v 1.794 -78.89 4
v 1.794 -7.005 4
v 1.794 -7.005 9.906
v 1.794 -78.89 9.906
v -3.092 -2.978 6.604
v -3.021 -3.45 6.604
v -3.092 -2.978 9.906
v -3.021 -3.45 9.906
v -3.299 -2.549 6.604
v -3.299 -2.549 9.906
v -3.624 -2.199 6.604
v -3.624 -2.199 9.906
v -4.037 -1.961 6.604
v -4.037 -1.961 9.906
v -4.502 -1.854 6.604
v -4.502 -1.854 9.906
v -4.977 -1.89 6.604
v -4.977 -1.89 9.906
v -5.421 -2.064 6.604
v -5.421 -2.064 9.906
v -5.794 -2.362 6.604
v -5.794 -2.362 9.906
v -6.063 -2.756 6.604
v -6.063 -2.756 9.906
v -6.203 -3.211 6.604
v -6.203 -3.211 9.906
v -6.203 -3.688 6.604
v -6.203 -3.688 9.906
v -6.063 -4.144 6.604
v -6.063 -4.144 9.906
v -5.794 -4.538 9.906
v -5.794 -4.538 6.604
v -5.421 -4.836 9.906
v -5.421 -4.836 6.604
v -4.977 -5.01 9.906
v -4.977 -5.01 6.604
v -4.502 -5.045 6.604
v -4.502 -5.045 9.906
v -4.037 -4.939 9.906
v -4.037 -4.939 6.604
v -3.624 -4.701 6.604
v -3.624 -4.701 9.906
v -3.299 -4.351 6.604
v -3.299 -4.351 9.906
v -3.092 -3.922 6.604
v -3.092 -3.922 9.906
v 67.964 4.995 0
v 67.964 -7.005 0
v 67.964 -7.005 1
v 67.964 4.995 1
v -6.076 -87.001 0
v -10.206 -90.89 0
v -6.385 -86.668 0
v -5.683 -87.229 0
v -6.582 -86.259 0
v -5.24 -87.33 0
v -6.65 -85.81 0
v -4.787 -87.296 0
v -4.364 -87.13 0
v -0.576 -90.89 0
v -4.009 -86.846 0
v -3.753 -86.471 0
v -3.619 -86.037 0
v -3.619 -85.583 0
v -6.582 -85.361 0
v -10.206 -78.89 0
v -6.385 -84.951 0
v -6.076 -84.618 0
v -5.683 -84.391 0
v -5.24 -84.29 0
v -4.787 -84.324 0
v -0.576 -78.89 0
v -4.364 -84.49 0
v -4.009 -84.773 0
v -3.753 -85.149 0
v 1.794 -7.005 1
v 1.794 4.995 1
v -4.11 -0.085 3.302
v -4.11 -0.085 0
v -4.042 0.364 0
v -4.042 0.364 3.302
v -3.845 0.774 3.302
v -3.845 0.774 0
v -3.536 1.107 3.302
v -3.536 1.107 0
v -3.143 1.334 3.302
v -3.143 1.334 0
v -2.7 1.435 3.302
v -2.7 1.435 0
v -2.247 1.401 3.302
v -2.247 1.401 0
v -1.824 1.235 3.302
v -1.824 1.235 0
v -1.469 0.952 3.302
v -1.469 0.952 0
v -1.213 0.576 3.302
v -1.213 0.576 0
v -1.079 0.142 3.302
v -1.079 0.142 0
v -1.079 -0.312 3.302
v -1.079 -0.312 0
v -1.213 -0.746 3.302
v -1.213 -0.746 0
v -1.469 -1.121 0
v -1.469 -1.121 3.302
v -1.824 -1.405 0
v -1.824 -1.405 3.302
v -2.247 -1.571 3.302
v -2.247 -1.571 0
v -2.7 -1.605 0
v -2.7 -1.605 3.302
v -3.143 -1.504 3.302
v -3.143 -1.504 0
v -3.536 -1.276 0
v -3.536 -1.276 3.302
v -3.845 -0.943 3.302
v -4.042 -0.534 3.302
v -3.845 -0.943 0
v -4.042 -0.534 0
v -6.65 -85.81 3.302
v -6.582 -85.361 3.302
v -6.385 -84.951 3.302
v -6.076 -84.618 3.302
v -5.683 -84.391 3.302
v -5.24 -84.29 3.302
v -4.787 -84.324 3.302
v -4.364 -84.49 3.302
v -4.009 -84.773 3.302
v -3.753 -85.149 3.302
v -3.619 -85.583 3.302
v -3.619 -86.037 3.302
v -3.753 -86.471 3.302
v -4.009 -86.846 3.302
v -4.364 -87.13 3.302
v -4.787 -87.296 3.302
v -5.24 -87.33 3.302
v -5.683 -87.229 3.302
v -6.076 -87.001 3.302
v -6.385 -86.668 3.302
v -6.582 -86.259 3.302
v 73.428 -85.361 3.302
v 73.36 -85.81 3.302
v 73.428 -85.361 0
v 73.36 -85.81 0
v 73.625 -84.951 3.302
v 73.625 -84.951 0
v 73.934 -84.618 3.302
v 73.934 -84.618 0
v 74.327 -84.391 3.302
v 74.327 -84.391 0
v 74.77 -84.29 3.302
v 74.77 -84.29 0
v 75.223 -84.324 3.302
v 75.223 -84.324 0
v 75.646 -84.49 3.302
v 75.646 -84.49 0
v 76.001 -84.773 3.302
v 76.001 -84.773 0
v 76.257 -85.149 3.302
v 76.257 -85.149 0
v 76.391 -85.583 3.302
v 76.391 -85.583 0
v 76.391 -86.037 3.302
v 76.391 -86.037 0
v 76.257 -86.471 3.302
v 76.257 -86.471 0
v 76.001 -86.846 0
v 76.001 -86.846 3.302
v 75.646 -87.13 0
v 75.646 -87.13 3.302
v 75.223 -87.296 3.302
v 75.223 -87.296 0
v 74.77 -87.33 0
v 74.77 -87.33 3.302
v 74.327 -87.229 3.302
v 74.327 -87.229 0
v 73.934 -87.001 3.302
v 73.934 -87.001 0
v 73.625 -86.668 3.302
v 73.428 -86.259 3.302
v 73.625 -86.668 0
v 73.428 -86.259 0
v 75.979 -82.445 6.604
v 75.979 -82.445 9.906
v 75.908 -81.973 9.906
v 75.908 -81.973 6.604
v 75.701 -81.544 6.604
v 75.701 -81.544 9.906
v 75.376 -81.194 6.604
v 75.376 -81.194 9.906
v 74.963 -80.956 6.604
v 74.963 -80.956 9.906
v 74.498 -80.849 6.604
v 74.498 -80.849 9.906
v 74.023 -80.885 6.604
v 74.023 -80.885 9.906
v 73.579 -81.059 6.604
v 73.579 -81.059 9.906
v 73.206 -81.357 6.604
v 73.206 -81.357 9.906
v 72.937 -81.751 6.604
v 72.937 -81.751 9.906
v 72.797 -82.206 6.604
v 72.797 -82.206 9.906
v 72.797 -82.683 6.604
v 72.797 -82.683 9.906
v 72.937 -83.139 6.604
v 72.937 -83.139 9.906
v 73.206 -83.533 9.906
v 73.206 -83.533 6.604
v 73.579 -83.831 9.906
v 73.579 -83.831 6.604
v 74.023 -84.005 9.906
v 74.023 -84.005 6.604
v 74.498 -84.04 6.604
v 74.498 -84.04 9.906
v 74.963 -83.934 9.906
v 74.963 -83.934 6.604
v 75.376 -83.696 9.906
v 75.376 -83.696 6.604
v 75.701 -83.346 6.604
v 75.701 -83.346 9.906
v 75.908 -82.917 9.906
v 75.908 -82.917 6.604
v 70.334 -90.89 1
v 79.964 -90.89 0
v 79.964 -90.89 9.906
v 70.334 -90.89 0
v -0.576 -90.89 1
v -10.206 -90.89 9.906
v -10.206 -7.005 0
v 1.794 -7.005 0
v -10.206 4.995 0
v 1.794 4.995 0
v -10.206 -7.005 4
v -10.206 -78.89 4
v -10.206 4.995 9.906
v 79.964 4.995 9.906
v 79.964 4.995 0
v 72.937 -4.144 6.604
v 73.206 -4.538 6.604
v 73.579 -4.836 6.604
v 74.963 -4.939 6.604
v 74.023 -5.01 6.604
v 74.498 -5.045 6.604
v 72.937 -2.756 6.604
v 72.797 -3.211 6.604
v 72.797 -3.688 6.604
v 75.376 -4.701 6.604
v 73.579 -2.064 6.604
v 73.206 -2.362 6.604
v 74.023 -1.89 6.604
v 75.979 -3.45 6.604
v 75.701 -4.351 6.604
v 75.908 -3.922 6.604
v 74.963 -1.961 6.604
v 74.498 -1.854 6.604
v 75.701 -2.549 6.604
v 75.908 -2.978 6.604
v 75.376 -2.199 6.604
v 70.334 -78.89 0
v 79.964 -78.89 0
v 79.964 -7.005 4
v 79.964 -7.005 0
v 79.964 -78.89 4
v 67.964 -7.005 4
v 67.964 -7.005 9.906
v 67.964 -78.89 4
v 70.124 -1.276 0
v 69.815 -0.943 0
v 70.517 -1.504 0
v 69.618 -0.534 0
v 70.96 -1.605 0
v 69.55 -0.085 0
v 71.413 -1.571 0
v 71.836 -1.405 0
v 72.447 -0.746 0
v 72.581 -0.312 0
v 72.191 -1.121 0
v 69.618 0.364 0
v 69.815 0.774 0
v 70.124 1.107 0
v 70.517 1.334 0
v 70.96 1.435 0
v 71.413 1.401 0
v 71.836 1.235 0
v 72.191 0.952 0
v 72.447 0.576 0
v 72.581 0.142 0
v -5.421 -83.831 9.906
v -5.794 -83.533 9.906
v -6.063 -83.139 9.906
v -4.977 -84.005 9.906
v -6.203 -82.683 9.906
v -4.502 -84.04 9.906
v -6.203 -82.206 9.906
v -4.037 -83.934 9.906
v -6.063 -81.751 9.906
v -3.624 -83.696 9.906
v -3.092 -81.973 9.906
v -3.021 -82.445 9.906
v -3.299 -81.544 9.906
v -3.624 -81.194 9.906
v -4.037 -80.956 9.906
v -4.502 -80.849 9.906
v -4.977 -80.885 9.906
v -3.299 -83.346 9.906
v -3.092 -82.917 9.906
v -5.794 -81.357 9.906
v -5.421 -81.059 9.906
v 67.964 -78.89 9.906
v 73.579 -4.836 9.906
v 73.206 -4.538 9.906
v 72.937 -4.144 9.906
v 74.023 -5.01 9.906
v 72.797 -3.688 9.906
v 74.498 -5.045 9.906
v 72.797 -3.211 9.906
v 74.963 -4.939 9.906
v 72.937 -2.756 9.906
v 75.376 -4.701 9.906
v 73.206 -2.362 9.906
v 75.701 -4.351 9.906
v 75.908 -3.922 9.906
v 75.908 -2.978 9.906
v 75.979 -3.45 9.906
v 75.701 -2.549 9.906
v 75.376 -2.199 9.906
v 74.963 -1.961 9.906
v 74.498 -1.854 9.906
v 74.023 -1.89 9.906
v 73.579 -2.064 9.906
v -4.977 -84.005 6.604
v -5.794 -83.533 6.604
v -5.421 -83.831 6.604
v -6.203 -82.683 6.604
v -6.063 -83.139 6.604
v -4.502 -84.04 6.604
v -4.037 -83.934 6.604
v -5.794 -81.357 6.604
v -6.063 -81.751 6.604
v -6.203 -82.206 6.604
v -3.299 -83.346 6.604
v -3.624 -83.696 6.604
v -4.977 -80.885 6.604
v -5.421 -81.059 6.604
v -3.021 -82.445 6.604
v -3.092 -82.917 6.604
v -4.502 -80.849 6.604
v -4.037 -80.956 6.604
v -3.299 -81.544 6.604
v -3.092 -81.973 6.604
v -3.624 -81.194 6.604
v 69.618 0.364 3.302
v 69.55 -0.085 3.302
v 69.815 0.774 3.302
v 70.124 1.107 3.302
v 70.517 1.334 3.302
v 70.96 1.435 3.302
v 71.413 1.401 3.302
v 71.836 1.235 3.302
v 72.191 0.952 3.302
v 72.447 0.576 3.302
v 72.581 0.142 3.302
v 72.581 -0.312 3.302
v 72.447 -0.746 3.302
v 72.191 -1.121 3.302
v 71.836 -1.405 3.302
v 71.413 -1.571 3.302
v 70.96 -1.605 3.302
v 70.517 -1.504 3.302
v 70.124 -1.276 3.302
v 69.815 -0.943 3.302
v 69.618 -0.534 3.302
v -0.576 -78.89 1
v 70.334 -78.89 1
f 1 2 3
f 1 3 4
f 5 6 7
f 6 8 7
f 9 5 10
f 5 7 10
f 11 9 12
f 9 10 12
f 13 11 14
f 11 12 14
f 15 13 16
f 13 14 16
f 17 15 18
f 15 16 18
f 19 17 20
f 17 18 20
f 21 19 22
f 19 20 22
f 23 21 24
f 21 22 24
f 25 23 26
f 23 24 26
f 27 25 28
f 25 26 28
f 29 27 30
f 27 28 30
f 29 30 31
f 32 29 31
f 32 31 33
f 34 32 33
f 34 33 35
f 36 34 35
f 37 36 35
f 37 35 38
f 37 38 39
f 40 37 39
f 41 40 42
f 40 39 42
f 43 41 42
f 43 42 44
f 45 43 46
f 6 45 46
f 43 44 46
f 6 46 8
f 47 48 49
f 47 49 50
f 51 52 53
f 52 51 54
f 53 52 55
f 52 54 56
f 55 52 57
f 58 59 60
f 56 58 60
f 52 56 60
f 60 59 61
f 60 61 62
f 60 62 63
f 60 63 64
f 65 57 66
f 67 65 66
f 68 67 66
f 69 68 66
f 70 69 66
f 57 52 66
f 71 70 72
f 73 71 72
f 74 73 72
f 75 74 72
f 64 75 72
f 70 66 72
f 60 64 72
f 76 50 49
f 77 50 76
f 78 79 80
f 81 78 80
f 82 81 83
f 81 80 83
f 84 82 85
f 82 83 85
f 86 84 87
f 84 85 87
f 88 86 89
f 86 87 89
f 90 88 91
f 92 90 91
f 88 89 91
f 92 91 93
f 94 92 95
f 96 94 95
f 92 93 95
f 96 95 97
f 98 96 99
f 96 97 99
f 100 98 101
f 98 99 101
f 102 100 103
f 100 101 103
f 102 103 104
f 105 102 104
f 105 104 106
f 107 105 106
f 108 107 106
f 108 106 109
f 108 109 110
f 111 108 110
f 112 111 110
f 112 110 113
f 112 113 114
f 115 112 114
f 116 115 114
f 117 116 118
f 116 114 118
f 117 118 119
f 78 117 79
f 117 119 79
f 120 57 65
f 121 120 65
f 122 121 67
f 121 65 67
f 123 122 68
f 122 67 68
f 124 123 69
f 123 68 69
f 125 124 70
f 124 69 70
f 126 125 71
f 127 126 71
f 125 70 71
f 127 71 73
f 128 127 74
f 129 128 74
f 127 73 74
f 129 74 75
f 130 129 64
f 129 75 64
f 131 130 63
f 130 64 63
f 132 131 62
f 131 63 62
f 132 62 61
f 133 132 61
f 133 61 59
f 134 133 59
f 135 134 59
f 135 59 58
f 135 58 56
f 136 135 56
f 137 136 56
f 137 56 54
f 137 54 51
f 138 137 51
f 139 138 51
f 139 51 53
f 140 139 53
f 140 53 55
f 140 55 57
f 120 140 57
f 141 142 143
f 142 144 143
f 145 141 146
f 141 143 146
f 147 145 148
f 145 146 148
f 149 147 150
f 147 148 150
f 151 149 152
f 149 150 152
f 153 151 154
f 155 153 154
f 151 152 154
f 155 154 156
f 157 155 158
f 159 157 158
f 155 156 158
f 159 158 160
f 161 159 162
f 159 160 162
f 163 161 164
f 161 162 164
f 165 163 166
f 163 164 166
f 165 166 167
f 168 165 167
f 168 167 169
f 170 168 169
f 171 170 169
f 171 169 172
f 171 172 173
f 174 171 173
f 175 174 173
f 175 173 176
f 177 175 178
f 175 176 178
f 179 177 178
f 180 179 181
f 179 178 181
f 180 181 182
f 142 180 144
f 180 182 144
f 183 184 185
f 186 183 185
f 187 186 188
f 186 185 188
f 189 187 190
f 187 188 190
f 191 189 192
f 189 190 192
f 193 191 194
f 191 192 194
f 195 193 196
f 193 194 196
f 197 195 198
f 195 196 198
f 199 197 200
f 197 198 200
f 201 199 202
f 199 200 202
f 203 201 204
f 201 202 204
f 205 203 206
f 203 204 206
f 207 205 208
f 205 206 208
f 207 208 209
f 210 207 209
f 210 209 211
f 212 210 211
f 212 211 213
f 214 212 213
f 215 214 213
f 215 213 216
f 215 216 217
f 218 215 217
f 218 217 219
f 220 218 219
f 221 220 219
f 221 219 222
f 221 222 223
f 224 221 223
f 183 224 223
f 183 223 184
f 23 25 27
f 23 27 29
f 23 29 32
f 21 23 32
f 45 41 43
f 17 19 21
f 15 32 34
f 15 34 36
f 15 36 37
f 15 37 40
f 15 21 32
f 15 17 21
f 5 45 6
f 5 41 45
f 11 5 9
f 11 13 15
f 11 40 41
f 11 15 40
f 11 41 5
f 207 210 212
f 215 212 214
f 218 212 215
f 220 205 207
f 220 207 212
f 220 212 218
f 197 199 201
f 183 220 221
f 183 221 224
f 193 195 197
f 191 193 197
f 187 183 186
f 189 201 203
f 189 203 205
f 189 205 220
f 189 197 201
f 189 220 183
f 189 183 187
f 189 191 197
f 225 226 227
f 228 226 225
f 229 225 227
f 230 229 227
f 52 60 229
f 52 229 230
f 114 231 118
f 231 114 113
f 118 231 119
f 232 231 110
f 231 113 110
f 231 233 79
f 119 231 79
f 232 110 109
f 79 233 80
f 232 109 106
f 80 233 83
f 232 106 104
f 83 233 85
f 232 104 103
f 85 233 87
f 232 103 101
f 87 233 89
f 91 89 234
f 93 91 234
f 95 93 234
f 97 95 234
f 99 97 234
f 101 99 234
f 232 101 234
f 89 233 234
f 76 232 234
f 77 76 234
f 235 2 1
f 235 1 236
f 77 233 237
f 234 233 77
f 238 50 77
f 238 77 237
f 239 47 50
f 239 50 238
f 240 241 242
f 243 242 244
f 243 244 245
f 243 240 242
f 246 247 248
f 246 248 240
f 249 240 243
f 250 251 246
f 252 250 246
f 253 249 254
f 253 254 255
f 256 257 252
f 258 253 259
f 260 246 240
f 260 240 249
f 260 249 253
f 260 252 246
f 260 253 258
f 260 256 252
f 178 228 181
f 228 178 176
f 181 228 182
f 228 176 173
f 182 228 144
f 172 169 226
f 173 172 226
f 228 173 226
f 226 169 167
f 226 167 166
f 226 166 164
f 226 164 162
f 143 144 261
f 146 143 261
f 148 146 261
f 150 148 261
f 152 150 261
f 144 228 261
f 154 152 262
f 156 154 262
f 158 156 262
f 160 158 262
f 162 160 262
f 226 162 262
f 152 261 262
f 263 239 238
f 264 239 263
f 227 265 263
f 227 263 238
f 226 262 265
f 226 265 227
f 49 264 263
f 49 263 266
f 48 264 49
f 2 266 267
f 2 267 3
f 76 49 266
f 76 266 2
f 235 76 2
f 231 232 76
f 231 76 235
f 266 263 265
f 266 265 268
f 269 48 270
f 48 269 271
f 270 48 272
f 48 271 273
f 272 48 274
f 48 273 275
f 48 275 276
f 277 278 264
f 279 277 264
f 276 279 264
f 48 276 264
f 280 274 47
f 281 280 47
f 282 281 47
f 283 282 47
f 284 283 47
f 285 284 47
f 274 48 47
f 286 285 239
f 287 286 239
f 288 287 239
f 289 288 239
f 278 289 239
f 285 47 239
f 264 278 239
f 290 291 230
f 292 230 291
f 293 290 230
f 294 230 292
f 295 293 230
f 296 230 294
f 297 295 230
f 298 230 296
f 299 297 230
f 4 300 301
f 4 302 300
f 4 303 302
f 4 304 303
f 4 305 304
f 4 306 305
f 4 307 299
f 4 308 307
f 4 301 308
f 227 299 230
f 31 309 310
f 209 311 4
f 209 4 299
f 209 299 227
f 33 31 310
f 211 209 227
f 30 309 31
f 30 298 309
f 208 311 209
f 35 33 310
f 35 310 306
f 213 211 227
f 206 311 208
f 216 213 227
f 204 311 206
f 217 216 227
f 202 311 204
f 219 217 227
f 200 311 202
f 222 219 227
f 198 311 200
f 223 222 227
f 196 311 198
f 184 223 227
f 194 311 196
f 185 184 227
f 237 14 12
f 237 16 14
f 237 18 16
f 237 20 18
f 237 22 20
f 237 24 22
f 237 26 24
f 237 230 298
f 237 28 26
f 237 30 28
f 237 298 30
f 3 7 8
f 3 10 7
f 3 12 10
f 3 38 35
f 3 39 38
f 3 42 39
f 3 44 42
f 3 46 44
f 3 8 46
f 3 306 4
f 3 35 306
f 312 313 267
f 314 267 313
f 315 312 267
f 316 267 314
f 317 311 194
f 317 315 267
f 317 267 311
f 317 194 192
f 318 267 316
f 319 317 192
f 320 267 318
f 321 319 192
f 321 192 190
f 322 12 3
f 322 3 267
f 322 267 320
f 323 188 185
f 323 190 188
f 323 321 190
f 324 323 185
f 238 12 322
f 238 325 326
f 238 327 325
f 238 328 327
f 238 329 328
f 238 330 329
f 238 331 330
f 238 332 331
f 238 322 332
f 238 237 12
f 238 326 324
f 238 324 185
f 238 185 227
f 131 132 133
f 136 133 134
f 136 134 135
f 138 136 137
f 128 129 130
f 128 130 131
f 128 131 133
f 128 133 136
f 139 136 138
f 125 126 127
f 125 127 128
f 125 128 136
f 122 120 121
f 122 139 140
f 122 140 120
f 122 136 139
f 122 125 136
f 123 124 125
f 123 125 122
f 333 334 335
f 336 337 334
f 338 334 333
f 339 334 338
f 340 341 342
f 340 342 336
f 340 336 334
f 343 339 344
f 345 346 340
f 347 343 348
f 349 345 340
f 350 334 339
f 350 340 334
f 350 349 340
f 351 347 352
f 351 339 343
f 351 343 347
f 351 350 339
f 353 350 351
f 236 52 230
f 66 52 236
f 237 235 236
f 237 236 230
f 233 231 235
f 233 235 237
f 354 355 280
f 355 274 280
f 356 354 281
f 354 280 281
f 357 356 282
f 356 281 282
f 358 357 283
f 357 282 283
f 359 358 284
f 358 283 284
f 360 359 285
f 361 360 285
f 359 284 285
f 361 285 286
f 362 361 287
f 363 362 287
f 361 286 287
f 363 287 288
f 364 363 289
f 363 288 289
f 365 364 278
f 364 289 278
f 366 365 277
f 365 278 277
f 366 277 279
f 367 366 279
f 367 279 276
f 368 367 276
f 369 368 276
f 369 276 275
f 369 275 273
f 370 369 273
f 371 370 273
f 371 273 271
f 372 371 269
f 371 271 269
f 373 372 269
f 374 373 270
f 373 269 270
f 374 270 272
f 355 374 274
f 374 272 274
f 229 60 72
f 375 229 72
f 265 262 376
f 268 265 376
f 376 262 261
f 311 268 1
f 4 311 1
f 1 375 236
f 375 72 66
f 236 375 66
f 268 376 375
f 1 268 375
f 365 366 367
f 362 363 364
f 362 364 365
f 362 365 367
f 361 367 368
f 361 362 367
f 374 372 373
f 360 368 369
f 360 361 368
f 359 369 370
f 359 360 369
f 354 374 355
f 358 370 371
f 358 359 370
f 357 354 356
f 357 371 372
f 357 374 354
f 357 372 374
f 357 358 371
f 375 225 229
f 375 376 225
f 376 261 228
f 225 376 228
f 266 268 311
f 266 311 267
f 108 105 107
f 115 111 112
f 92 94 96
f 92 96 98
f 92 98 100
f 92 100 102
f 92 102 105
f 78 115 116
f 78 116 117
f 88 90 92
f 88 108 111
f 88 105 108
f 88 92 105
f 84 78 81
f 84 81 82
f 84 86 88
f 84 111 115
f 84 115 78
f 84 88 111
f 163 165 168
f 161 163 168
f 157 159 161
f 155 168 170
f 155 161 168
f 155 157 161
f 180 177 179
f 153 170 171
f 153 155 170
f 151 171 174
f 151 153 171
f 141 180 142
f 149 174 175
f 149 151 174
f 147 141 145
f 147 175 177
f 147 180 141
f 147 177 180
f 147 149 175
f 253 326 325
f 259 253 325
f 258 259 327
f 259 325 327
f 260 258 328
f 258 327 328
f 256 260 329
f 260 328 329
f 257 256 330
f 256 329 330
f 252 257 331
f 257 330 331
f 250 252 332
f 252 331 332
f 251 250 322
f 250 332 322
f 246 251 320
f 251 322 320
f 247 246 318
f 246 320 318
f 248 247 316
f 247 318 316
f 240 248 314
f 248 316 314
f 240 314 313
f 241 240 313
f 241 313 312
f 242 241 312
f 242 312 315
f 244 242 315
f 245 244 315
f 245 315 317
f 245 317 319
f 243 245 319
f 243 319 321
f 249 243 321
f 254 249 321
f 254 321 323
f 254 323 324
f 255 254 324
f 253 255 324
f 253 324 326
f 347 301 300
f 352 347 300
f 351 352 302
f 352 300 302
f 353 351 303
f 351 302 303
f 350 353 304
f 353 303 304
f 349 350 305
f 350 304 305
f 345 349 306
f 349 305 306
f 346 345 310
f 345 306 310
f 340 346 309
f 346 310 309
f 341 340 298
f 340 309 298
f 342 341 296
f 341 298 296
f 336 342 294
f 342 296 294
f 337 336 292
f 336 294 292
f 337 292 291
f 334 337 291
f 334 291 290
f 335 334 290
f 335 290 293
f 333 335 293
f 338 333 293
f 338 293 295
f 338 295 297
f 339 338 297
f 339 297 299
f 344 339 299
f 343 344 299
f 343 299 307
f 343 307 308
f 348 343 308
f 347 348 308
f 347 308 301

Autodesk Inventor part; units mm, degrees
ref_plane "YZ Plane" through (0, 0, 0) normal (1, 0, 0) x (0, 1, 0)
ref_plane "XZ Plane" through (0, 0, 0) normal (0, 1, 0) x (-1, 0, 0)
ref_plane "XY Plane" through (0, 0, 0) normal (0, 0, 1) x (1, 0, 0)
sketch "Sketch1" plane through (0, 0, 0) normal (0, 0, 1) x (1, 0, 0)
  line L0 (-10.2061, 4.9951) -> (79.9639, 4.9951)
  line L1 (79.9639, 4.9951) -> (79.9639, -90.8899)
  line L2 (79.9639, -90.8899) -> (-10.2061, -90.8899)
  line L3 (-10.2061, -90.8899) -> (-10.2061, 4.9951)
  line L4 (67.9639, -78.8899) -> (1.7939, -78.8899)
  line L5 (67.9639, -78.8899) -> (67.9639, -7.0049)
  line L6 (67.9639, -7.0049) -> (1.7939, -7.0049)
  line L7 (1.7939, -7.0049) -> (1.7939, -78.8899)
  point P0 (0, 0)
  dimension "d0" = 90.17
  dimension "d1" = 95.885
extrude "Extrusion1" add sketch "Sketch1" along normal blind 9.906
sketch "Sketch2" plane through (0, 0, 9.906) normal (0, 0, 1) x (1, 0, 0)
  circle A0 centre (-4.6211, -82.4449) radius 1.6
  circle A1 centre (74.3789, -82.4449) radius 1.6
  circle A2 centre (-4.6211, -3.4499) radius 1.6
  circle A3 centre (74.3789, -3.4499) radius 1.6
  line L0 (79.9639, 4.9951) -> (-10.2061, 4.9951) projected
  line L1 (-10.2061, -90.8899) -> (79.9639, -90.8899) projected
  line L2 (79.9639, -90.8899) -> (79.9639, 4.9951) projected
  line L3 (-10.2061, 4.9951) -> (-10.2061, -90.8899) projected
  point P0 (0, 0)
  dimension "d18" = 3.2
  dimension "d19" = 3.2
  dimension "d20" = 3.2
  dimension "d21" = 3.2
  dimension "d22" = 8.445
  dimension "d23" = 8.445
  dimension "d24" = 8.445
  dimension "d25" = 8.445
  dimension "d26" = 5.585
  dimension "d27" = 5.585
  dimension "d28" = 5.585
  dimension "d29" = 5.585
extrude "Extrusion2" cut sketch "Sketch2" against normal blind 3.302 contours A0 | A1 | A2 | A3
thread "Thread1" size "6-32 UNC" class "2B" standard "ANSI Unified Screw Threads" full length
thread "Thread2" size "6-32 UNC" class "2B" standard "ANSI Unified Screw Threads" full length
thread "Thread3" size "6-32 UNC" class "2B" standard "ANSI Unified Screw Threads" full length
thread "Thread4" size "6-32 UNC" class "2B" standard "ANSI Unified Screw Threads" full length
sketch "Sketch3" plane through (0, 0, 0) normal (0, 0, -1) x (-1, 0, 0)
  circle A0 centre (-71.0739, -0.0849) radius 1.524
  circle A1 centre (5.1261, -85.8099) radius 1.524
  circle A2 centre (-74.8839, -85.8099) radius 1.524
  circle A3 centre (2.5861, -0.0849) radius 1.524
  line L0 (-79.9639, 4.9951) -> (10.2061, 4.9951) projected
  line L1 (-79.9639, -90.8899) -> (-79.9639, 4.9951) projected
  line L2 (10.2061, -90.8899) -> (-79.9639, -90.8899) projected
  line L3 (10.2061, 4.9951) -> (10.2061, -90.8899) projected
  point P0 (0, 0)
  dimension "d40" = 3.048
  dimension "d41" = 3.048
  dimension "d42" = 3.048
  dimension "d43" = 3.048
  dimension "d45" = 8.89
  dimension "d46" = 90.805
  dimension "d47" = 5.08
  dimension "d48" = 5.08
  dimension "d50" = 85.09
  dimension "d51" = 5.08
  dimension "d52" = 82.55
  dimension "d53" = 90.805
extrude "Extrusion3" cut sketch "Sketch3" against normal blind 3.302 contours A0 | A1 | A2 | A3
sketch "Sketch4" plane through (0, 0, 0) normal (0, 0, -1) x (-1, 0, 0)
  line L0 (-1.7939, -7.0049) -> (-67.9639, -7.0049) projected
  line L1 (-1.7939, -7.0049) -> (10.2061, -7.0049)
  line L2 (10.2061, 4.9951) -> (10.2061, -90.8899) projected
  line L3 (-1.7939, -78.8899) -> (10.2061, -78.8899)
  line L4 (-67.9639, -78.8899) -> (-1.7939, -78.8899) projected
  line L5 (10.2061, -78.8899) -> (-67.9639, -78.8899)
  line L6 (-67.9639, -78.8899) -> (-79.9639, -78.8899)
  line L7 (-79.9639, -90.8899) -> (-79.9639, 4.9951) projected
  line L8 (-67.9639, -7.0049) -> (-79.9639, -7.0049)
  line L9 (-67.9639, -7.0049) -> (-67.9639, -78.8899) projected
  line L10 (-67.9639, -7.8922) -> (-67.9639, -78.8899)
  line L11 (-67.9639, -78.8899) -> (-79.9639, -78.8899)
  line L12 (-1.7939, -7.0049) -> (-67.9639, -7.0049) projected
  line L13 (-79.9639, -7.0049) -> (-1.7939, -7.0049)
  line L14 (-1.7939, -78.8899) -> (-1.7939, -7.0049) projected
  line L15 (-1.7939, -7.0049) -> (-1.7939, -78.8899)
  line L16 (-1.7939, -78.8899) -> (10.2061, -78.8899)
  point P0 (0, 0)
extrude "Extrusion4" cut sketch "Sketch4" against normal blind 4 contours L1 L2 L3 L14 | L9 L6 L7 L8
sketch "Sketch5" plane through (0, 0, 0) normal (0, 0, -1) x (-1, 0, 0)
  line L0 (-79.9639, 4.9951) -> (10.2061, 4.9951) projected
  circle A0 centre (-71.0739, -0.0849) radius 1.524 projected
  circle A1 centre (2.5861, -0.0849) radius 1.524 projected
  line L1 (-1.7939, -7.0049) -> (-67.9639, -7.0049) projected
  line L2 (-1.7939, -7.0049) -> (-1.7939, 4.9951)
  line L3 (-67.9639, -7.0049) -> (-67.9639, 4.9951)
  line L4 (-67.9639, -7.0049) -> (-67.9639, -78.8899) projected
  line L5 (-67.9639, -78.8899) -> (-67.9639, -90.8899)
  line L6 (10.2061, -90.8899) -> (-79.9639, -90.8899) projected
  line L7 (-67.9639, -78.8899) -> (-1.7939, -78.8899) projected
  line L8 (-1.7939, -78.8899) -> (-1.7939, -90.8899)
  point P0 (0, 0)
extrude "Extrusion5" cut sketch "Sketch5" against normal blind 1 contours L7 L8 L6 L5 | L0 L2 L1 L3
sketch "Sketch6" plane through (0, 0, 0) normal (0, 0, -1) x (-1, 0, 0)
  line L0 (0.5761, -90.8899) -> (0.5761, -83.261)
  circle A0 centre (-74.8839, -85.8099) radius 1.524 projected
  circle A1 centre (5.1261, -85.8099) radius 1.524 projected
  line L1 (0.5761, -83.261) -> (0.5761, -78.8899)
  line L2 (10.2061, -78.8899) -> (-1.7939, -78.8899) projected
  line L3 (-70.3339, -87.0755) -> (-70.3339, -90.8899)
  line L4 (-70.3339, -87.0755) -> (-70.3339, -78.8899)
  line L5 (-67.9639, -78.8899) -> (-79.9639, -78.8899) projected
  line L6 (10.2061, -90.8899) -> (-79.9639, -90.8899) projected
  line L7 (-67.9639, -90.8899) -> (-67.9639, -78.8899)
  line L8 (-70.3339, -78.8899) -> (-70.3339, -90.8899)
  line L9 (-1.7939, -90.8899) -> (0.5761, -90.8899)
  line L10 (-67.9639, -78.8899) -> (-1.7939, -78.8899) projected
  line L11 (0.5761, -78.8899) -> (-1.7939, -78.8899)
  line L12 (-1.7939, -78.8899) -> (-1.7939, -90.8899) projected
  line L13 (-1.7939, -78.8899) -> (-1.7939, -90.8899)
  point P0 (0, 0)
  dimension "d63" = 4.55
extrude "Extrusion6" cut sketch "Sketch6" against normal blind 1 contours L6 L12 L2 L1 L0 | L6 L3 L4 L5 L7
thread "Thread5" size "5-40 UNC" class "2B" standard "ANSI Unified Screw Threads" full length
thread "Thread6" size "5-40 UNC" class "2B" standard "ANSI Unified Screw Threads" full length
thread "Thread7" size "5-40 UNC" class "2B" standard "ANSI Unified Screw Threads" full length
thread "Thread8" size "5-40 UNC" class "2B" standard "ANSI Unified Screw Threads" full length
equation "\"BendRadius\" = Thickness"
equation "\"BendReliefWidth\" = Thickness"
equation "\"BendReliefDepth\" = 0.5 * Thickness"
equation "\"CornerReliefSize\" = 4 * Thickness"
equation "\"MinimumRemnant\" = 2 * Thickness"
equation "\"TransitionRadius\" = BendRadius"
equation "\"JacobiRadiusSize\" = BendRadius"
equation "\"GapSize\" = Thickness"
equation "\"Thickness\" = 3.048"
properties part number "ThomasBracket v2"
